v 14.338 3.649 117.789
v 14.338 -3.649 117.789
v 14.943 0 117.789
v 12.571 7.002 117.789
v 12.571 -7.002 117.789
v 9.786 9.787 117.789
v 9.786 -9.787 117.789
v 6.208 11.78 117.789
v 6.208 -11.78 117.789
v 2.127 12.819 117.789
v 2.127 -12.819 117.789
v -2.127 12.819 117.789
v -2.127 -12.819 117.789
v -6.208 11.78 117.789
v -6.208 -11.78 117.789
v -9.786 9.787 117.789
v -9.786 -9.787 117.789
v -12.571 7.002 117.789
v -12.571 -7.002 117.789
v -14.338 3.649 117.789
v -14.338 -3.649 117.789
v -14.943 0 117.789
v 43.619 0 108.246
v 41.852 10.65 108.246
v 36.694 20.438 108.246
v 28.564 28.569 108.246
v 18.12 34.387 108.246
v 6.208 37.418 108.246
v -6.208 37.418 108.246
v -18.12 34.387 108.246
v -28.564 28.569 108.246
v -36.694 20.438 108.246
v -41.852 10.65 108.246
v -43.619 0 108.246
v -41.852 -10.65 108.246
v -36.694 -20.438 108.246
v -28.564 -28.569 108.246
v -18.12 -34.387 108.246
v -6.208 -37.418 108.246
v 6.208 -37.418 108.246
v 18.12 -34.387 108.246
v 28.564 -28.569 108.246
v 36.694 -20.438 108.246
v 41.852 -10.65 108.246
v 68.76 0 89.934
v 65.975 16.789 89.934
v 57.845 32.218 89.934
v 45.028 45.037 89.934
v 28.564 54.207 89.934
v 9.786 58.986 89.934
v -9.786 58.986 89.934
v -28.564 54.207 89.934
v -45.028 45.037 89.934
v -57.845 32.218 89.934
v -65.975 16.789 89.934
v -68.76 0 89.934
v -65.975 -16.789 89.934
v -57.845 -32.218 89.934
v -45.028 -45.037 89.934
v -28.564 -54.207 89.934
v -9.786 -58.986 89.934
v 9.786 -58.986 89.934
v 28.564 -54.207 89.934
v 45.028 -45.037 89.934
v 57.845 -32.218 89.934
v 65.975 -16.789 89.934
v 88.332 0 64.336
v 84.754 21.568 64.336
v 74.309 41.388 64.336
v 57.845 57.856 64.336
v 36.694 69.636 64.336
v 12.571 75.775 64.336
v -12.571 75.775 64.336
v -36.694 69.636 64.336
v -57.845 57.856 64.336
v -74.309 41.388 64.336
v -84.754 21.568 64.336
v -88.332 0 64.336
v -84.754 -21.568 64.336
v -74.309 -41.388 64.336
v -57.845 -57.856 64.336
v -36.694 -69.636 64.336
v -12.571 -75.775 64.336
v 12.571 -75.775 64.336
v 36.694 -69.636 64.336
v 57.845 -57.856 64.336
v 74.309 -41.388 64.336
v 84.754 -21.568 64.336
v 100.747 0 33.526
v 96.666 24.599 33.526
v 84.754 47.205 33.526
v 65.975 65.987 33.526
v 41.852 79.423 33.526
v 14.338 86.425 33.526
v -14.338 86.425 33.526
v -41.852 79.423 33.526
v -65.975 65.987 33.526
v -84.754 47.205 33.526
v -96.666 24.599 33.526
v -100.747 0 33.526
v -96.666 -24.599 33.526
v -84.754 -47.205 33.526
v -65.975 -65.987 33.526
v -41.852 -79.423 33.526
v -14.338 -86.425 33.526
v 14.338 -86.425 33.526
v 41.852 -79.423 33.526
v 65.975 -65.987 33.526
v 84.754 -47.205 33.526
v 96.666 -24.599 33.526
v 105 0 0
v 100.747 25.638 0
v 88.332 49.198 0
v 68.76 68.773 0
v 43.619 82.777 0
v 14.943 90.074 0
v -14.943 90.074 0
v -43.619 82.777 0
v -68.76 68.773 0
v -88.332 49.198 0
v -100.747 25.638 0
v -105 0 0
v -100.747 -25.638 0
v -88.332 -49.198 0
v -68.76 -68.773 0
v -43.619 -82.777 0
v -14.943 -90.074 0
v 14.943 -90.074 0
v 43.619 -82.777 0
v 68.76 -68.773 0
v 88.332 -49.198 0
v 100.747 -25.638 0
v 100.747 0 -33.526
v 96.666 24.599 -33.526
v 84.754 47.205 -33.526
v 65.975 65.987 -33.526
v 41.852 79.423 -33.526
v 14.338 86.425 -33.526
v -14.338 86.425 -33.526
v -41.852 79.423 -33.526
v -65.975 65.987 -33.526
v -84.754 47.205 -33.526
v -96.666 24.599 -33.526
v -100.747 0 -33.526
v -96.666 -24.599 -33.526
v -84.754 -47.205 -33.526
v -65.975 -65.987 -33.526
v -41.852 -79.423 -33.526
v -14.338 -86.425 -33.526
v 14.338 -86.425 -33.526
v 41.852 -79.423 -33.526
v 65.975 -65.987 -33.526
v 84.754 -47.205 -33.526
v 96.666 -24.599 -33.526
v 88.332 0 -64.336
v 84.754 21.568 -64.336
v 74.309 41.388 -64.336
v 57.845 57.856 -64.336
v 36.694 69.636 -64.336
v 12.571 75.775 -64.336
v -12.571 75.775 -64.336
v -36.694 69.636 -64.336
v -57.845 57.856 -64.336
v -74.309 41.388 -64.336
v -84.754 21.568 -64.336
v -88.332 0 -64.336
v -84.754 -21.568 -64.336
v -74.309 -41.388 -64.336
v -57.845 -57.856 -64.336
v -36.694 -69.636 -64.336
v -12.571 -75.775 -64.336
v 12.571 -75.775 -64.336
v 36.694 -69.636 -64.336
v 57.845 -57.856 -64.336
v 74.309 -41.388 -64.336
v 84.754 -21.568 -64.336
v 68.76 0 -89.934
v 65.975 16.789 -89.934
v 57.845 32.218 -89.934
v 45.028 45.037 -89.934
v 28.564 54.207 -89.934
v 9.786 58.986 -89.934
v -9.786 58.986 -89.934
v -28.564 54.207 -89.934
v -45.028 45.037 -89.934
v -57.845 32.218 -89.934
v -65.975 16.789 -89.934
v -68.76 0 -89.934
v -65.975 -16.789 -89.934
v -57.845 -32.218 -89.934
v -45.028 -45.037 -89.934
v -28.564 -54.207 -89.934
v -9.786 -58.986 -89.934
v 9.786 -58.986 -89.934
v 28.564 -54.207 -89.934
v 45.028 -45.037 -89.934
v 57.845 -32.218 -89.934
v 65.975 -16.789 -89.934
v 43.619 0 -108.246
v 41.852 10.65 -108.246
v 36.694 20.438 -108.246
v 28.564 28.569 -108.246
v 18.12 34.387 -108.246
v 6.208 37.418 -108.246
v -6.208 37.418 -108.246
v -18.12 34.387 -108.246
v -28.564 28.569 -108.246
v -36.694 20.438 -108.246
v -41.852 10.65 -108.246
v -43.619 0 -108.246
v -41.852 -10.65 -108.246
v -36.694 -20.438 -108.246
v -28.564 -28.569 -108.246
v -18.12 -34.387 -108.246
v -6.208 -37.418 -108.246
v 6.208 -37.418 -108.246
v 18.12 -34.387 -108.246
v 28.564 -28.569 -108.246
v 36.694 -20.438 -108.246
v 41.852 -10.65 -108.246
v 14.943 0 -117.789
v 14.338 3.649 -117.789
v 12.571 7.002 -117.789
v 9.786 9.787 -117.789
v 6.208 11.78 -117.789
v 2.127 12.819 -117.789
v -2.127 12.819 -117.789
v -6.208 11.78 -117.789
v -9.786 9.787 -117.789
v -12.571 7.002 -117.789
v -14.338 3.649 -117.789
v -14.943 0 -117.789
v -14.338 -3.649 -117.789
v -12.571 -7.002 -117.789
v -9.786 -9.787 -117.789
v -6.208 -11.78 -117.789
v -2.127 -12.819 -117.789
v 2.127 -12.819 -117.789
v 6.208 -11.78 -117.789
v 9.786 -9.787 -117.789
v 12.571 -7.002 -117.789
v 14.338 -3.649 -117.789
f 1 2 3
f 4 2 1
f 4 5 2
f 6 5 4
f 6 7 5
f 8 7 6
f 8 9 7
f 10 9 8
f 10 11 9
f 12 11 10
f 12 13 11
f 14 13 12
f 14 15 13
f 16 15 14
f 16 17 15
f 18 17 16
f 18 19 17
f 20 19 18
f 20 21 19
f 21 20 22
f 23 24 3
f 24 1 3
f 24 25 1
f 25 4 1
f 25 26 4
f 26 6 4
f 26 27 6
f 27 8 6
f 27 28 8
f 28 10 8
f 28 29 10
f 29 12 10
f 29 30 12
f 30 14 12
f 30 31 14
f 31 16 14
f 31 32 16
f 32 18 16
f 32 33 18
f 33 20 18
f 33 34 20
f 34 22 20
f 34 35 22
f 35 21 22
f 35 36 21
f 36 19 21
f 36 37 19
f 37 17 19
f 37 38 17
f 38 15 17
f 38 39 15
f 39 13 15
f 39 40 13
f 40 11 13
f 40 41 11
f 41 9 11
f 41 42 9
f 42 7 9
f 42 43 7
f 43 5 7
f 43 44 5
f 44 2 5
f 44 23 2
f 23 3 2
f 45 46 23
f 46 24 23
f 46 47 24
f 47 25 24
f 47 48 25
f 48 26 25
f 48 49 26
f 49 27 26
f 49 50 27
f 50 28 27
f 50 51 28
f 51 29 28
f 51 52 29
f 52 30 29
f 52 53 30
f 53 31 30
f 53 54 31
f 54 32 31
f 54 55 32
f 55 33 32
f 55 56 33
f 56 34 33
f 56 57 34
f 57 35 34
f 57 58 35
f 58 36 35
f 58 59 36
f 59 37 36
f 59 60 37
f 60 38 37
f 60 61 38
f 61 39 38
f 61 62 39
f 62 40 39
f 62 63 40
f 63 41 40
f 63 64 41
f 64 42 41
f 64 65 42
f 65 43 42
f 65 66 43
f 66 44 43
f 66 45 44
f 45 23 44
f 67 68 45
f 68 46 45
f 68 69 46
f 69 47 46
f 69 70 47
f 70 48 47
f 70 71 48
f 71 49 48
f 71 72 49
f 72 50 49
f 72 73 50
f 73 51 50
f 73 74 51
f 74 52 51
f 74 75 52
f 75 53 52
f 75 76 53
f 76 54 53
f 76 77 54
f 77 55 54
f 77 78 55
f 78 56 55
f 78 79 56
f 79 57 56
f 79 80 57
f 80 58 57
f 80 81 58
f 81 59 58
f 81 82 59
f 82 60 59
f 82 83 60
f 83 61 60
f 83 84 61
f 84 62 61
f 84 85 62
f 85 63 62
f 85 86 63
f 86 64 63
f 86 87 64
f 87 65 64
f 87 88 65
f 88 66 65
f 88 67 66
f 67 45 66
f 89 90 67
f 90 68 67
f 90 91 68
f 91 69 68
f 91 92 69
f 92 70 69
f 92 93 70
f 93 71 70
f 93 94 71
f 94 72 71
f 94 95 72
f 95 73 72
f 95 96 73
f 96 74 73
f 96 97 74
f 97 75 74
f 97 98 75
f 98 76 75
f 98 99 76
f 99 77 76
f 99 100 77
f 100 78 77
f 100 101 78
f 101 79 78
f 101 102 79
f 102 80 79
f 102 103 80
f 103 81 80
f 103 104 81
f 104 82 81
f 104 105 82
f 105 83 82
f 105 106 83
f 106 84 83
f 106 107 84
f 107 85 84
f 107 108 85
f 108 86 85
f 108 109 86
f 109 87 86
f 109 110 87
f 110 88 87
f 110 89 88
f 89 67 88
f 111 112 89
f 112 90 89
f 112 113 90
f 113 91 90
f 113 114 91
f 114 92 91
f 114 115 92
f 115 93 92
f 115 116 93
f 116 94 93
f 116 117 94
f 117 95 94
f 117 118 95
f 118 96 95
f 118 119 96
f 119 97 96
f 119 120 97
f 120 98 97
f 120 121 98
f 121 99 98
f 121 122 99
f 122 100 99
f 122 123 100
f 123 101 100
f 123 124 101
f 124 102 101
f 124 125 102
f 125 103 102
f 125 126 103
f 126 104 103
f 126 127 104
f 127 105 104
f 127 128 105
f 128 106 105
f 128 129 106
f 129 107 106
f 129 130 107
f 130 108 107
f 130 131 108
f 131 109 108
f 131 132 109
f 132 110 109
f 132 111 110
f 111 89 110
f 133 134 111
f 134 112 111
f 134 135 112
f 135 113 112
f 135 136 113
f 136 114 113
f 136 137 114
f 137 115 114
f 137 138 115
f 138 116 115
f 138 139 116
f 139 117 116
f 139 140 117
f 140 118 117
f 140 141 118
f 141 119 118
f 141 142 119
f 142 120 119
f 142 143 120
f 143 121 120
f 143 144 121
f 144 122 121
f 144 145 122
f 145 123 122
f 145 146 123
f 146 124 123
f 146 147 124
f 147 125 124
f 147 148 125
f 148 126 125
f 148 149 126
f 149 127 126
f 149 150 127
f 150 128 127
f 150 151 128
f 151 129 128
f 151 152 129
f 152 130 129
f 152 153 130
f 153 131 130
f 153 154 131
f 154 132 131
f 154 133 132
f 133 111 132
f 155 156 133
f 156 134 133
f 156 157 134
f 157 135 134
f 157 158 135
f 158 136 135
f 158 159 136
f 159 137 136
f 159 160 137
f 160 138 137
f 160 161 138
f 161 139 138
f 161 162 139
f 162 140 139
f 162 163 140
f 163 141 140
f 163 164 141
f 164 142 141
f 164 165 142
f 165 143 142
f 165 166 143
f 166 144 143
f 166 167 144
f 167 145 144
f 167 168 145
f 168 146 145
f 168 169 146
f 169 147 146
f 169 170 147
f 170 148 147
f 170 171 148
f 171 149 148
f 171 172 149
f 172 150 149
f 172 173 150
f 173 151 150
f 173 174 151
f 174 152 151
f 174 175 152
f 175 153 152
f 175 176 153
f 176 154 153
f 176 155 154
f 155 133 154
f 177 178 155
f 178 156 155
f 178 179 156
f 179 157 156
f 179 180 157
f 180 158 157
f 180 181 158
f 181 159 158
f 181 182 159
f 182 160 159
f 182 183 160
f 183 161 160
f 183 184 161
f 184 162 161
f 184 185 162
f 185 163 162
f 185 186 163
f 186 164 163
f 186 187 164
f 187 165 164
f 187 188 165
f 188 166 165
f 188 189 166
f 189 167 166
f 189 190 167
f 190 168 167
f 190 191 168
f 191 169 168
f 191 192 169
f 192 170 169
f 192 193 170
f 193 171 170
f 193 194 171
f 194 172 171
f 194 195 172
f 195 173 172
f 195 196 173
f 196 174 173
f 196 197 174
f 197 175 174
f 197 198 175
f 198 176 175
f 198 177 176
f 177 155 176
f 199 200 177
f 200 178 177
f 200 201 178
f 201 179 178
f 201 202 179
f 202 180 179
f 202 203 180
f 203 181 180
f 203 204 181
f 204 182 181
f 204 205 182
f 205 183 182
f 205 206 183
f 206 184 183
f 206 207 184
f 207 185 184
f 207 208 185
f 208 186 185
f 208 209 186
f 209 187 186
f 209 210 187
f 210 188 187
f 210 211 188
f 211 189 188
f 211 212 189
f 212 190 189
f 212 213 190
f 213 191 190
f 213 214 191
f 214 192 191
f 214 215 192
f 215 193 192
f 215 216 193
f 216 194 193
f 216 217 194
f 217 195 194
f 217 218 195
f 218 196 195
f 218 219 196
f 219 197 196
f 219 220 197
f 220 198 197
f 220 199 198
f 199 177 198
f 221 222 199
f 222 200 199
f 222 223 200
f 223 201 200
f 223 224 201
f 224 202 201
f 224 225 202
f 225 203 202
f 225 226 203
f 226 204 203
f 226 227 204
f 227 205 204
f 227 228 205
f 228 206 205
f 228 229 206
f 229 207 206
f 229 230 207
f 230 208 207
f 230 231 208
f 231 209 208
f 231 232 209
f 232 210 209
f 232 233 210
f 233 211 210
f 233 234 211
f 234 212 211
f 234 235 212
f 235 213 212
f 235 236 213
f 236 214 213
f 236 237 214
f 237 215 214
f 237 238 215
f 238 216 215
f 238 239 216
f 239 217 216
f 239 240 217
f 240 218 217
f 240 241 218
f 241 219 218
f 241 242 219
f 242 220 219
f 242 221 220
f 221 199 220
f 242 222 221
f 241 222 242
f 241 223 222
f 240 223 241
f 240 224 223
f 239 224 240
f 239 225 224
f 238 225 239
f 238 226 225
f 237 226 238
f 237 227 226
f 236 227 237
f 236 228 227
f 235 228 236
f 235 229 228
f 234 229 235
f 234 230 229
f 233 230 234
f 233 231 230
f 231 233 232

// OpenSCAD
// Generated by SolidPython 1.0.1 on 2020-07-29 00:46:52


scale(v = [15, 13, 17]) {
	sphere(r = 7);
}
/***********************************************
*********      SolidPython code:      **********
************************************************
 
# import packages: SolidPython
from solid import *
from solid.utils import *
from itertools import chain, combinations, permutations


class Resize:

    def __init__(self, scad_file):
        self.scad_file = scad_file
        #self.scad_file = import_scad(scad_file)
        # cone/cylinder param:
        self.r1 = 0
        self.r2 = 0
        self.h = 0
        # rectangular prism param:
        self.w = 0
        self.l = 0
        # ellipse param:
        self.r = 0

    # import OpenScad code (file name corresponds to shape)


    # classify shape + parameters
    def assign(self, param1, param2, param3):
        if self.scad_file == 'cone.scad':
            self.r1 = param1
            self.r2 = param2
            self.h = param3
        elif self.scad_file == 'cylinder.scad':
            self.r1 = param1
            self.r2 = param2
            self.h = param3
        elif self.scad_file == 'rectangularPrism.scad':
            self.h = param1
            self.l = param2
            self.w = param3
        else:
            self.r = param1
            self.h = param2

    # resize parameters
    def iterate(self):
        x = range(3, 20, 2)
        i = 1
        if self.scad_file == 'cone.scad':
            tempList = list(permutations(x, 2))
            for temp in tempList:
                param1 = temp[0]
                param2 = temp[1]
                filepath = 'produced_scad_files/' + 'cone' + str(param1) + '_' + str(param2) + '_' + '.scad'
                scad_render_to_file(cylinder(h=param1, r1=param2, r2=0), filepath)

        elif self.scad_file == 'cylinder.scad':
            tempList = list(permutations(x, 3))
            for temp in tempList:
                param1 = temp[0]
                param2 = temp[1]
                filepath = 'produced_scad_files/' + 'cylinder' + str(param1) + '_' + str(param2) + '_' + '.scad'
                scad_render_to_file(cylinder(h=param1, r1=param2, r2=param2), filepath)

        elif self.scad_file == 'rectangularPrism.scad':
            tempList = list(permutations(x, 3))
            for temp in tempList:
                param1 = temp[0]
                param2 = temp[1]
                param3 = temp[2]
                filepath = 'produced_scad_files/' + 'rectangularPrism' + str(param1) + '_' + str(param2) + '_' + str(
                    param3) + '.scad'
                scad_render_to_file(cube(size=(param1, param2, param3)), filepath)

        elif self.scad_file == 'ellipse.scad':
            tempList = list(permutations(x, 4))
            for temp in tempList:
                param1 = temp[0]
                param2 = temp[1]
                param3 = temp[2]
                param4 = temp[3]
                filepath = 'produced_scad_files/' + 'ellipse' + str(param1) + '_' + str(param2) + '_' + str(param3) + '_' + str(param4) + '.scad'
                scad_render_to_file(scale([param1, param2, param3])(sphere(r=param4)), filepath)

    def render_to_scadfile(self):
        scad_render_to_file(scad, 'example.scad') 
 
************************************************/
